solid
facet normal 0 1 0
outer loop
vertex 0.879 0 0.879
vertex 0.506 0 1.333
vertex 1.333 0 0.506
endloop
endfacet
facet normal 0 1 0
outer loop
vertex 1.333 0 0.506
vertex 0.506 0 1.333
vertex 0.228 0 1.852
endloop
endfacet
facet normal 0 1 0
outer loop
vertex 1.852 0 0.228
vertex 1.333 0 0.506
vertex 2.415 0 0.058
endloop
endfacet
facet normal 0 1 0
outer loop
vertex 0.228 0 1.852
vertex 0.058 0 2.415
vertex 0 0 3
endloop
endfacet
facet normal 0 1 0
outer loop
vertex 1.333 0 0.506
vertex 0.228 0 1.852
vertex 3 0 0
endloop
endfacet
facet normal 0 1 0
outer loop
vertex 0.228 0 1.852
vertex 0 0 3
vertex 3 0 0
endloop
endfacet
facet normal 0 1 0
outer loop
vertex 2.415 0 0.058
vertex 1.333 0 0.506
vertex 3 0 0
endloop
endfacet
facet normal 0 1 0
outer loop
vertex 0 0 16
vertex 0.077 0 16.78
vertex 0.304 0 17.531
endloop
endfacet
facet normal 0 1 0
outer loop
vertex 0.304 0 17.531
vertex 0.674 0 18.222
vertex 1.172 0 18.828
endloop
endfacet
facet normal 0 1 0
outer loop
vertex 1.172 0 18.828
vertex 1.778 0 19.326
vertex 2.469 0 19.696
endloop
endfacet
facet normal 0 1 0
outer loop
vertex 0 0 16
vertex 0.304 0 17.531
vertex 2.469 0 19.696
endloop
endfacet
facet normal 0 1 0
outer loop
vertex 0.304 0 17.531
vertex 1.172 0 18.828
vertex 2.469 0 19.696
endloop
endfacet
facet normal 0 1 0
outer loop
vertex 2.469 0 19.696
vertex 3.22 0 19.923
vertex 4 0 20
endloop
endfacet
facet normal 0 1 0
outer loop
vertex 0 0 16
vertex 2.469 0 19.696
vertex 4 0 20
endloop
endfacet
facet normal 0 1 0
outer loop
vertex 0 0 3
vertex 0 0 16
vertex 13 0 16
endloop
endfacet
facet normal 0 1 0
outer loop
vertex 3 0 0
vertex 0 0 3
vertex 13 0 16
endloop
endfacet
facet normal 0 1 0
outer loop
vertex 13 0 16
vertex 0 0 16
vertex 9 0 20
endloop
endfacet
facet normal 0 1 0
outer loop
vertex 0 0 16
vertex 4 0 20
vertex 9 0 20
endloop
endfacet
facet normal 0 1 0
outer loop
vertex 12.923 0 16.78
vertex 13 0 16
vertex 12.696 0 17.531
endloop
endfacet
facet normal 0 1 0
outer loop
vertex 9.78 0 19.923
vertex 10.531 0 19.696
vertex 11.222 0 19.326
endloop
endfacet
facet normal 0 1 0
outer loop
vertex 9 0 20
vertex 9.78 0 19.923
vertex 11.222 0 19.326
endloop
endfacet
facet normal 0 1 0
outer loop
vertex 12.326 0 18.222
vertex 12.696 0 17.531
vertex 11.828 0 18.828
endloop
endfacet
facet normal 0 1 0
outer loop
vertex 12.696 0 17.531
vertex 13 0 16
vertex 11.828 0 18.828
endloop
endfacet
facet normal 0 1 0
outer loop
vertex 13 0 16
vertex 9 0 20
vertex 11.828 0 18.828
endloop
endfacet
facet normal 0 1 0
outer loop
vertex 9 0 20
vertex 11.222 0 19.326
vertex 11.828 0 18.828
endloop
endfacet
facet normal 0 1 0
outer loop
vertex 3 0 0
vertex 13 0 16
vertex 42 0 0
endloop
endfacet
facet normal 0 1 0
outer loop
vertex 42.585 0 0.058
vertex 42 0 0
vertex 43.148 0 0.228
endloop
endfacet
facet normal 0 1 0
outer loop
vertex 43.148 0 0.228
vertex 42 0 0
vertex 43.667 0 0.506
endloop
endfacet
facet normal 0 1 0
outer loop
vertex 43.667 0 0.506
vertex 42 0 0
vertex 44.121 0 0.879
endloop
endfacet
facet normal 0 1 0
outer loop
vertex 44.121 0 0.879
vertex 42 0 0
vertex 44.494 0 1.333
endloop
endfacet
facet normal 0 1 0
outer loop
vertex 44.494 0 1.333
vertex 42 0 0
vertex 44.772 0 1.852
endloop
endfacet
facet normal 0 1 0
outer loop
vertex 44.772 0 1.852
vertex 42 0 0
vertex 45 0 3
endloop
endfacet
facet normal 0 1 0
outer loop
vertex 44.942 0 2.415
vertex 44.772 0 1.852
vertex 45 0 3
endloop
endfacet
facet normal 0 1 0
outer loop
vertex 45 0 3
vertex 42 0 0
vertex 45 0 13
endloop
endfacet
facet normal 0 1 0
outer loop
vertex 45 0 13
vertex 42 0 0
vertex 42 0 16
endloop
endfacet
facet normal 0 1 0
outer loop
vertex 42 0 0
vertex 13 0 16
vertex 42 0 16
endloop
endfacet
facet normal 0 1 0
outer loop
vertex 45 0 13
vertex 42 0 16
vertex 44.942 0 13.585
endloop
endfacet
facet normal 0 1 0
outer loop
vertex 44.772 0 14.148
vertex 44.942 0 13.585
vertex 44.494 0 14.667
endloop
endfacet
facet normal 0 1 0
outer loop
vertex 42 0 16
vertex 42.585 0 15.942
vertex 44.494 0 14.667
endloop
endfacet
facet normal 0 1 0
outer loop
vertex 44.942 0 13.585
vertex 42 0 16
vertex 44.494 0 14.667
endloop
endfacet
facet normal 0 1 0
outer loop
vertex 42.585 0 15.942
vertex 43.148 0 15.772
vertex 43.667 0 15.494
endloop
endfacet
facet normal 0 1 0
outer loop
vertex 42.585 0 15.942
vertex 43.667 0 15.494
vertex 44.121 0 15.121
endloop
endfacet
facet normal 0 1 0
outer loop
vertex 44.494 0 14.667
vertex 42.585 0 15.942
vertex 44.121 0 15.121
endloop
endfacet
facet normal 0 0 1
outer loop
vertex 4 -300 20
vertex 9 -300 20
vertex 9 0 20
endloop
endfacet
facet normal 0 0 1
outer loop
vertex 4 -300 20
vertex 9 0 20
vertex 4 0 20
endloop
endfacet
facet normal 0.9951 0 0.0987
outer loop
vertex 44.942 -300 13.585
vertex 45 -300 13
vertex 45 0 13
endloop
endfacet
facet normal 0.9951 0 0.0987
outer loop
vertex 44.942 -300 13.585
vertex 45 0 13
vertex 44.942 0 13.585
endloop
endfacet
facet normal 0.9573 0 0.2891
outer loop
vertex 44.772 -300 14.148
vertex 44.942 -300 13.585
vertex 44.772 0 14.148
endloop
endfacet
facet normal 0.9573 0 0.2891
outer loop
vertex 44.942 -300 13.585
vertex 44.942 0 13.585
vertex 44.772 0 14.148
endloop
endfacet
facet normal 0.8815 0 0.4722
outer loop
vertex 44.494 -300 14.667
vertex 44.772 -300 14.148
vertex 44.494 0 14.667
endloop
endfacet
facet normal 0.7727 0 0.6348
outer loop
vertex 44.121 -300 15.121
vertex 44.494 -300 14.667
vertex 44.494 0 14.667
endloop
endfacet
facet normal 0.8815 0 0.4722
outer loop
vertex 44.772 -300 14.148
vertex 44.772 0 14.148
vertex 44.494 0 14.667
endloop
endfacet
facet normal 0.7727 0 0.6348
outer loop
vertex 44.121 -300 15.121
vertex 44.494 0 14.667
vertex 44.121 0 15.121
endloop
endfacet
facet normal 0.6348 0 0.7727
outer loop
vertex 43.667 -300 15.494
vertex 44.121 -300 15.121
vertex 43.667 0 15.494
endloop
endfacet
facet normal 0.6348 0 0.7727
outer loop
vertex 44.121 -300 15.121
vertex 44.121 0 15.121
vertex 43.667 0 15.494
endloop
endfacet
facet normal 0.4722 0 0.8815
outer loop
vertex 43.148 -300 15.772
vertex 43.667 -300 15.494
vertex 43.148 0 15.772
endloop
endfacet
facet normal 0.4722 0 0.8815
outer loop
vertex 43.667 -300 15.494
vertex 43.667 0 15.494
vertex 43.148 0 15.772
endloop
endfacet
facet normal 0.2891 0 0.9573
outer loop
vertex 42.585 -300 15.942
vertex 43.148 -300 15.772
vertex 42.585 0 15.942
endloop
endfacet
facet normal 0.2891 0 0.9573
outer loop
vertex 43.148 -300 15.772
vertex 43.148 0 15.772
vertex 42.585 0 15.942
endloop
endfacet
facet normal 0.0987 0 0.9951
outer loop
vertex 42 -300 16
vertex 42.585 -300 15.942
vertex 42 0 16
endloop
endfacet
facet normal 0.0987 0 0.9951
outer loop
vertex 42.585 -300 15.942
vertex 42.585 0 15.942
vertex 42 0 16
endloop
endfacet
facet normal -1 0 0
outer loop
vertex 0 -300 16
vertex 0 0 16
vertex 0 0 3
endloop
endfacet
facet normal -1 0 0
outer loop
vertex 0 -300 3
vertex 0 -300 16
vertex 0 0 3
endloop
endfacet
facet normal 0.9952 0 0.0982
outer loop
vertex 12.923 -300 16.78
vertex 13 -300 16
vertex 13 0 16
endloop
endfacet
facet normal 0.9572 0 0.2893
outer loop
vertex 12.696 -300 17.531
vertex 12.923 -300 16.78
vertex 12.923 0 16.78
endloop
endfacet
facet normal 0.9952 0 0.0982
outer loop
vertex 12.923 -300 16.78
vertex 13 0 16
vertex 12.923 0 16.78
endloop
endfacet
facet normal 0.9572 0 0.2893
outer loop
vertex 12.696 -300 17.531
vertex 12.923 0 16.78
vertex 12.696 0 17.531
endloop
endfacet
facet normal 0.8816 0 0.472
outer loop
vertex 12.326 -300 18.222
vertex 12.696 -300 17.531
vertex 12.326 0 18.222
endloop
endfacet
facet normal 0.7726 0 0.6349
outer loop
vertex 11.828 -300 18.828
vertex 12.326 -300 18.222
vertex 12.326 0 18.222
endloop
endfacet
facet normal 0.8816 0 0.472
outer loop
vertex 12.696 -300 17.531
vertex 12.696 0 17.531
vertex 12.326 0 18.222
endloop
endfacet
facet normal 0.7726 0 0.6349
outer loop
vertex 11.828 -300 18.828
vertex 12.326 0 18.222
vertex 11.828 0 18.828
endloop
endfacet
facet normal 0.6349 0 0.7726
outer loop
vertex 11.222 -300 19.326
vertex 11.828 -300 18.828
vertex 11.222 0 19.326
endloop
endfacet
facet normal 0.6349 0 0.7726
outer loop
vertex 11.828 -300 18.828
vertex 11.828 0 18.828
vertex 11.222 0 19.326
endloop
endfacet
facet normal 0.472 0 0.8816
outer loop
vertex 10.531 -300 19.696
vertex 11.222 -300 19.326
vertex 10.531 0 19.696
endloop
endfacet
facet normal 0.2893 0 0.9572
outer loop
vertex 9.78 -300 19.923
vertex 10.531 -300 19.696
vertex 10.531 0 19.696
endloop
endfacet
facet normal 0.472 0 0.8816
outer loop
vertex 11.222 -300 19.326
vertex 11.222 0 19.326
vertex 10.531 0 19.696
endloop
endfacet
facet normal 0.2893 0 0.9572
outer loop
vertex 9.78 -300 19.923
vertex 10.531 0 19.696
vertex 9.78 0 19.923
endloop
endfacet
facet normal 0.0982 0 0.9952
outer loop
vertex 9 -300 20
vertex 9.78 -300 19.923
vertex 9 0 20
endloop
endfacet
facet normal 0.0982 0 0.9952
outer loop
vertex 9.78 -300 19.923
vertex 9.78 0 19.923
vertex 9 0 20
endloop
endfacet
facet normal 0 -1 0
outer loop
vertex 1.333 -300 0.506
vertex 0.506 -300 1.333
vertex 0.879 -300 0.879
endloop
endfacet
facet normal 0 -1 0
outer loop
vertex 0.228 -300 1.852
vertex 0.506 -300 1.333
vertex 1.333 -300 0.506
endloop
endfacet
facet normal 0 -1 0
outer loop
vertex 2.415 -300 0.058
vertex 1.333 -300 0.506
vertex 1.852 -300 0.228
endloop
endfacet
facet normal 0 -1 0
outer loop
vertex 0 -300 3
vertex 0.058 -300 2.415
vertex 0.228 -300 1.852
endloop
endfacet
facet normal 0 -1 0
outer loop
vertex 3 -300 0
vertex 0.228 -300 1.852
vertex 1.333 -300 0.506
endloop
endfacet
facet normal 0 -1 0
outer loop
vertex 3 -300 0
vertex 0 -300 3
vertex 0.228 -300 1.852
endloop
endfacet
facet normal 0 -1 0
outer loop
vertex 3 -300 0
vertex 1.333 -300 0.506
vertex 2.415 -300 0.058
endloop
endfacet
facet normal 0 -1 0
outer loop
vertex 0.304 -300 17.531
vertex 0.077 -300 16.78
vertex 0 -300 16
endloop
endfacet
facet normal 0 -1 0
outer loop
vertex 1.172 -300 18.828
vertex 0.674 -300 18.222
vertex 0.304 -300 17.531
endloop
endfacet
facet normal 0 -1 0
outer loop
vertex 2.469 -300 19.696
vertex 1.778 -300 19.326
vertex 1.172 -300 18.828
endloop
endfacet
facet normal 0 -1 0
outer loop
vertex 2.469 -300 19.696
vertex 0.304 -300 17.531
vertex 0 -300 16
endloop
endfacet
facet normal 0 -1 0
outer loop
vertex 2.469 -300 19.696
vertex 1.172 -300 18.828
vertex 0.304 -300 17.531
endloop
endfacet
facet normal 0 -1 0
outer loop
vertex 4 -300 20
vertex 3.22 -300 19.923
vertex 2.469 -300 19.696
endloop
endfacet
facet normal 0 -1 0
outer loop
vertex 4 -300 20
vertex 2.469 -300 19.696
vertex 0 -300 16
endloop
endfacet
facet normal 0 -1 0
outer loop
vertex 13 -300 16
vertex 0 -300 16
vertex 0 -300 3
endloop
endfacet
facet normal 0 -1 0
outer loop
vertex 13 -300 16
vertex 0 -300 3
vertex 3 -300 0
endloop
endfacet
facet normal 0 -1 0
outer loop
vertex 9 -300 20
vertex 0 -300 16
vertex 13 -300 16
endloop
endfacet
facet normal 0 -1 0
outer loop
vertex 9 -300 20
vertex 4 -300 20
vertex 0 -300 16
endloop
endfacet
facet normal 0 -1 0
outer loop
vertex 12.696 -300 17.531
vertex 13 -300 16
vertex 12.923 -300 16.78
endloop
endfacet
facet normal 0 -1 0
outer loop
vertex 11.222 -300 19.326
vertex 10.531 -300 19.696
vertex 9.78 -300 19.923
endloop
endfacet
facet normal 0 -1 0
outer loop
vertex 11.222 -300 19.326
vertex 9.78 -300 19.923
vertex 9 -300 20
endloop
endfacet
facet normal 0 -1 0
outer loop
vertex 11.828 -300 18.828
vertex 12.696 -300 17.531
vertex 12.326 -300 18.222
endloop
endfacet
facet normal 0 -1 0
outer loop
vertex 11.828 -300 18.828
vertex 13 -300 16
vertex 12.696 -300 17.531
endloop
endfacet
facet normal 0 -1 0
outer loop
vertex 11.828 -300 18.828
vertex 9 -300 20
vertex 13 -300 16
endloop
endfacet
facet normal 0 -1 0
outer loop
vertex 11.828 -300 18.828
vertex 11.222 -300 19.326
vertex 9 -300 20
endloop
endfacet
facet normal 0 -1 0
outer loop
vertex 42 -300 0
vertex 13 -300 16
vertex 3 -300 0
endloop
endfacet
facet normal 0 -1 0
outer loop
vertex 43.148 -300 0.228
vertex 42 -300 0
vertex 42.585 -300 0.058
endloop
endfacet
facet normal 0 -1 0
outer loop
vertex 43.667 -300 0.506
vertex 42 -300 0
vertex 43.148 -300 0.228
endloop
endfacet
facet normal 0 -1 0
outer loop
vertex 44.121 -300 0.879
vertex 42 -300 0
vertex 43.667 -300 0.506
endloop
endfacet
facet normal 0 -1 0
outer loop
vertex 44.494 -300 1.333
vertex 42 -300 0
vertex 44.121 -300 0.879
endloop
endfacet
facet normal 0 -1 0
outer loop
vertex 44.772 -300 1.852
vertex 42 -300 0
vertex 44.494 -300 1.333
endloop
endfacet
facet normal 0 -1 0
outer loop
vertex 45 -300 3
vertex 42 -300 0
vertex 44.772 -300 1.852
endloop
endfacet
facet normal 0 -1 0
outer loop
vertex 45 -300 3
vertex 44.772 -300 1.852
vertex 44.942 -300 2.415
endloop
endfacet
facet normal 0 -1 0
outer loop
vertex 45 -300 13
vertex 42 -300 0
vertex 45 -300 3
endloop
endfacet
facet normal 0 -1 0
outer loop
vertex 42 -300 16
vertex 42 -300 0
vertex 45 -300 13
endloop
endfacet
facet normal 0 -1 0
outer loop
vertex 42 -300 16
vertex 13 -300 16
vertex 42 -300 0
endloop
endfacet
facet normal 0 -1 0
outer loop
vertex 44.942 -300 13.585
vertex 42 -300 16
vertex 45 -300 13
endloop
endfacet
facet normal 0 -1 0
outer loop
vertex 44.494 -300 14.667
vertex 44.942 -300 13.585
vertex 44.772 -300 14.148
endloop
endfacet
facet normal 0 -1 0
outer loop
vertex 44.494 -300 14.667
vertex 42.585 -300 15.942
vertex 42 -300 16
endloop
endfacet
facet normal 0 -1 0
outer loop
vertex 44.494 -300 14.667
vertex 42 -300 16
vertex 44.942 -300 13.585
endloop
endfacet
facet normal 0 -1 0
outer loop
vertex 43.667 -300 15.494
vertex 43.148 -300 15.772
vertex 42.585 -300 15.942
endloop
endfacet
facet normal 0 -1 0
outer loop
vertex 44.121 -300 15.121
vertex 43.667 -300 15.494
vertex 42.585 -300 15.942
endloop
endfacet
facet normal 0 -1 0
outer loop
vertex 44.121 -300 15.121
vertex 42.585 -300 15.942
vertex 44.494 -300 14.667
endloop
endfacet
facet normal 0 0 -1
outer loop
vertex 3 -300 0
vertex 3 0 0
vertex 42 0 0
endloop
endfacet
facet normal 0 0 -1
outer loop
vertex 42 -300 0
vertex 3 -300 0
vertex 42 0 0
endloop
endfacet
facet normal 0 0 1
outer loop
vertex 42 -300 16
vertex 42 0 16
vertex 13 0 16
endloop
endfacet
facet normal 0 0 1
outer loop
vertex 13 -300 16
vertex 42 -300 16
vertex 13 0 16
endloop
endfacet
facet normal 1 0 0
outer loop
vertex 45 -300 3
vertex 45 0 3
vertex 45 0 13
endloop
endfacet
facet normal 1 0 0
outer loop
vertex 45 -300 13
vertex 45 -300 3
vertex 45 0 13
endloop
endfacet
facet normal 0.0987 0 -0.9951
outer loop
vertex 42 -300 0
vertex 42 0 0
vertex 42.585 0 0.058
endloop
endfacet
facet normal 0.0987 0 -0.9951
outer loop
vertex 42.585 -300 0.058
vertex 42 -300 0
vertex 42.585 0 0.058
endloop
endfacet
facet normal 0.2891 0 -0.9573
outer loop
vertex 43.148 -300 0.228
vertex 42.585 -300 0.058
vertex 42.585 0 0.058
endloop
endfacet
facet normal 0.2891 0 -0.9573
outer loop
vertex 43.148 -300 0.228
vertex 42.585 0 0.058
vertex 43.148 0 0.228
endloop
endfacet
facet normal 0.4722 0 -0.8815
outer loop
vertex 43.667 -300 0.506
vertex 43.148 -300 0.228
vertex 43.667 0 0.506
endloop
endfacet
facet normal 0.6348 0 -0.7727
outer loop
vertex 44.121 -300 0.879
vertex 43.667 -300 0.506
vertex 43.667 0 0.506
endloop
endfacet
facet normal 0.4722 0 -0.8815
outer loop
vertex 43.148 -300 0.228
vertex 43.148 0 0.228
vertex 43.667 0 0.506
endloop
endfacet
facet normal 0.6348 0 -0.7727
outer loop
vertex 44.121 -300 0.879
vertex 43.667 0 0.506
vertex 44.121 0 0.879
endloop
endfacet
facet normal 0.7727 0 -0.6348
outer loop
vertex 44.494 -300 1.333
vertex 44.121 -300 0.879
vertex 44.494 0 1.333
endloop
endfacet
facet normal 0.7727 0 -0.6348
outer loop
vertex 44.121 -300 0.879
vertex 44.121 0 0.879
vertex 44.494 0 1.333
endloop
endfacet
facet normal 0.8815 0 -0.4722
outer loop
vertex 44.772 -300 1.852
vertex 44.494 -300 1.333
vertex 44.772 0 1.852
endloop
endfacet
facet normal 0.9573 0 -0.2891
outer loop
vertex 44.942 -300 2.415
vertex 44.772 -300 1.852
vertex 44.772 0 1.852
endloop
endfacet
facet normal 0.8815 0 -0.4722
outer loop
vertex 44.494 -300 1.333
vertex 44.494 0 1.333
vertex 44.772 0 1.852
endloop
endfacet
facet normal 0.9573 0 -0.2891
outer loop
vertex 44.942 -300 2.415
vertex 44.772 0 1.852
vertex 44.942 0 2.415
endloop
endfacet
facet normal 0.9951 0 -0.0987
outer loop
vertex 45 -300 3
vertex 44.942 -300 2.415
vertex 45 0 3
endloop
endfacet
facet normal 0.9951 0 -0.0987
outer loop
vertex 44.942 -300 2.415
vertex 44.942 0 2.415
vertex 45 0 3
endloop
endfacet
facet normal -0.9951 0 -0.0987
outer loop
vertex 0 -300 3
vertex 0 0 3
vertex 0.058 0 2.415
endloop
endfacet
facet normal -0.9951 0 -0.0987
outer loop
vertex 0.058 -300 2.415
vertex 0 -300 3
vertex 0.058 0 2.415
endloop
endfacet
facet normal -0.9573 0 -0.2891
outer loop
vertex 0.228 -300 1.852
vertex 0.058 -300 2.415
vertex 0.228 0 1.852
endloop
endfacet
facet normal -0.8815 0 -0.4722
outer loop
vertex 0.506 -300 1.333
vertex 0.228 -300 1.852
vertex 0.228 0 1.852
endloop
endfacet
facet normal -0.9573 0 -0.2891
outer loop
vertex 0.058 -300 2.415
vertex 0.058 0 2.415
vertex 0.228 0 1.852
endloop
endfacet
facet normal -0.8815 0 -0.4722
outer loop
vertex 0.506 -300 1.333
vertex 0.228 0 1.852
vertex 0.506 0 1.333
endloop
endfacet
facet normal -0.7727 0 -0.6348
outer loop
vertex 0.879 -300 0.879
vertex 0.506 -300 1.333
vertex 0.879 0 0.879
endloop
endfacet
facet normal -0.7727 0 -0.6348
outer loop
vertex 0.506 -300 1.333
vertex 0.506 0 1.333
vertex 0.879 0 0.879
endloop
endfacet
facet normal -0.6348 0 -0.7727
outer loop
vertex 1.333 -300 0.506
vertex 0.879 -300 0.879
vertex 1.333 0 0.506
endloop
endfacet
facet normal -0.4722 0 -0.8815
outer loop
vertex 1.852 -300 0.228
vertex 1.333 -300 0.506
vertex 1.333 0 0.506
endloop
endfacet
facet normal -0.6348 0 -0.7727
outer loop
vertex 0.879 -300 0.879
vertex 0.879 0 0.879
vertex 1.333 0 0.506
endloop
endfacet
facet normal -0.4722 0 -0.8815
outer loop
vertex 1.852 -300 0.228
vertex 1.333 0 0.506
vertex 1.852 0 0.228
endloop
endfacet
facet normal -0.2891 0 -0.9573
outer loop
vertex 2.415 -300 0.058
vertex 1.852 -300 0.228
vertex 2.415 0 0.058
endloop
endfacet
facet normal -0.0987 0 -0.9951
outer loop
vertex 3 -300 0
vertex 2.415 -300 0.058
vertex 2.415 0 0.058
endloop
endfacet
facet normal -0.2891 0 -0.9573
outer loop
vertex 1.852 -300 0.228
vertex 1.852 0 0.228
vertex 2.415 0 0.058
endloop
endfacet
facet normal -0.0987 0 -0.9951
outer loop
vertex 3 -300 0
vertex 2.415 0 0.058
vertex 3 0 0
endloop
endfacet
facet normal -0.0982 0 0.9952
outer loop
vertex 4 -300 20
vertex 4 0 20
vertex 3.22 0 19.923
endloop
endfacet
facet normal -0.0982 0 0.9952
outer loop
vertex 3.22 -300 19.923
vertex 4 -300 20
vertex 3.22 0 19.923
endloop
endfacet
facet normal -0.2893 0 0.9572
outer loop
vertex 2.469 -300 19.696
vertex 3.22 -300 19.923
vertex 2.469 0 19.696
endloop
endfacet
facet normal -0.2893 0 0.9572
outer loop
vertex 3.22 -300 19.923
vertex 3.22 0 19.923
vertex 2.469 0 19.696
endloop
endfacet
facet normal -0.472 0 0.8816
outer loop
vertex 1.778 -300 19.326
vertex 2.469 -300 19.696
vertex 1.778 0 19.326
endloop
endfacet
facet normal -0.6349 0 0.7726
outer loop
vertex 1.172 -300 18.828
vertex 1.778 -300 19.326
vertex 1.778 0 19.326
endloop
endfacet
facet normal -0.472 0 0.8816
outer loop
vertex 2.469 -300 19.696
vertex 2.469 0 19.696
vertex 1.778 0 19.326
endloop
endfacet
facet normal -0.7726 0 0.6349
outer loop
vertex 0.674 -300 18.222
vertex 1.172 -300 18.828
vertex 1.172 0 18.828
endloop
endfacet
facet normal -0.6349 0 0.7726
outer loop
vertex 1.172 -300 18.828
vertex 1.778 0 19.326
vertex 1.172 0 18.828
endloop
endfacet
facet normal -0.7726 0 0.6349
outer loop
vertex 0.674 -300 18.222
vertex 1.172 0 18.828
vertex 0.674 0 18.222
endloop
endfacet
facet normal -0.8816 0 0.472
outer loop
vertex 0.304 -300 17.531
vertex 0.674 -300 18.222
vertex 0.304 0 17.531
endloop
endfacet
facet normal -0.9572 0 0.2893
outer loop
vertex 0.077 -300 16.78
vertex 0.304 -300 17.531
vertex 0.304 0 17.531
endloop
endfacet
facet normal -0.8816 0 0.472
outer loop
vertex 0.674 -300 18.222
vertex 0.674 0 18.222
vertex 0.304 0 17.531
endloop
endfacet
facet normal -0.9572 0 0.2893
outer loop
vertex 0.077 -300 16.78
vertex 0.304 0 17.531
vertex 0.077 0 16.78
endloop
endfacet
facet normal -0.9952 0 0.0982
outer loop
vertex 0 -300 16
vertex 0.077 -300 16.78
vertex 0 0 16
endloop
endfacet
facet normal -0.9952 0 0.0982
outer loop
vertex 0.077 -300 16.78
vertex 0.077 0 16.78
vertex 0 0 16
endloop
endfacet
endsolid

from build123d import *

# Parameters (mm, degrees)
F1_DEPTH = 300


with BuildPart() as f1:
    # F0 (on Front) → F1 (new body)
    with BuildSketch(Plane.XZ):
        with BuildLine():
            ThreePointArc((0, 3), (0.87868, 0.87868), (3, 0))
            Line((3, 0), (42, 0))
            ThreePointArc((42, 0), (44.12132, 0.87868), (45, 3))
            Line((45, 3), (45, 13))
            ThreePointArc((45, 13), (44.12132, 15.12132), (42, 16))
            Line((42, 16), (13, 16))
            ThreePointArc((13, 16), (11.828427, 18.828427), (9, 20))
            Line((9, 20), (4, 20))
            ThreePointArc((4, 20), (1.171573, 18.828427), (0, 16))
            Line((0, 16), (0, 3))
        make_face()
    extrude(amount=F1_DEPTH)


solid = f1.part
